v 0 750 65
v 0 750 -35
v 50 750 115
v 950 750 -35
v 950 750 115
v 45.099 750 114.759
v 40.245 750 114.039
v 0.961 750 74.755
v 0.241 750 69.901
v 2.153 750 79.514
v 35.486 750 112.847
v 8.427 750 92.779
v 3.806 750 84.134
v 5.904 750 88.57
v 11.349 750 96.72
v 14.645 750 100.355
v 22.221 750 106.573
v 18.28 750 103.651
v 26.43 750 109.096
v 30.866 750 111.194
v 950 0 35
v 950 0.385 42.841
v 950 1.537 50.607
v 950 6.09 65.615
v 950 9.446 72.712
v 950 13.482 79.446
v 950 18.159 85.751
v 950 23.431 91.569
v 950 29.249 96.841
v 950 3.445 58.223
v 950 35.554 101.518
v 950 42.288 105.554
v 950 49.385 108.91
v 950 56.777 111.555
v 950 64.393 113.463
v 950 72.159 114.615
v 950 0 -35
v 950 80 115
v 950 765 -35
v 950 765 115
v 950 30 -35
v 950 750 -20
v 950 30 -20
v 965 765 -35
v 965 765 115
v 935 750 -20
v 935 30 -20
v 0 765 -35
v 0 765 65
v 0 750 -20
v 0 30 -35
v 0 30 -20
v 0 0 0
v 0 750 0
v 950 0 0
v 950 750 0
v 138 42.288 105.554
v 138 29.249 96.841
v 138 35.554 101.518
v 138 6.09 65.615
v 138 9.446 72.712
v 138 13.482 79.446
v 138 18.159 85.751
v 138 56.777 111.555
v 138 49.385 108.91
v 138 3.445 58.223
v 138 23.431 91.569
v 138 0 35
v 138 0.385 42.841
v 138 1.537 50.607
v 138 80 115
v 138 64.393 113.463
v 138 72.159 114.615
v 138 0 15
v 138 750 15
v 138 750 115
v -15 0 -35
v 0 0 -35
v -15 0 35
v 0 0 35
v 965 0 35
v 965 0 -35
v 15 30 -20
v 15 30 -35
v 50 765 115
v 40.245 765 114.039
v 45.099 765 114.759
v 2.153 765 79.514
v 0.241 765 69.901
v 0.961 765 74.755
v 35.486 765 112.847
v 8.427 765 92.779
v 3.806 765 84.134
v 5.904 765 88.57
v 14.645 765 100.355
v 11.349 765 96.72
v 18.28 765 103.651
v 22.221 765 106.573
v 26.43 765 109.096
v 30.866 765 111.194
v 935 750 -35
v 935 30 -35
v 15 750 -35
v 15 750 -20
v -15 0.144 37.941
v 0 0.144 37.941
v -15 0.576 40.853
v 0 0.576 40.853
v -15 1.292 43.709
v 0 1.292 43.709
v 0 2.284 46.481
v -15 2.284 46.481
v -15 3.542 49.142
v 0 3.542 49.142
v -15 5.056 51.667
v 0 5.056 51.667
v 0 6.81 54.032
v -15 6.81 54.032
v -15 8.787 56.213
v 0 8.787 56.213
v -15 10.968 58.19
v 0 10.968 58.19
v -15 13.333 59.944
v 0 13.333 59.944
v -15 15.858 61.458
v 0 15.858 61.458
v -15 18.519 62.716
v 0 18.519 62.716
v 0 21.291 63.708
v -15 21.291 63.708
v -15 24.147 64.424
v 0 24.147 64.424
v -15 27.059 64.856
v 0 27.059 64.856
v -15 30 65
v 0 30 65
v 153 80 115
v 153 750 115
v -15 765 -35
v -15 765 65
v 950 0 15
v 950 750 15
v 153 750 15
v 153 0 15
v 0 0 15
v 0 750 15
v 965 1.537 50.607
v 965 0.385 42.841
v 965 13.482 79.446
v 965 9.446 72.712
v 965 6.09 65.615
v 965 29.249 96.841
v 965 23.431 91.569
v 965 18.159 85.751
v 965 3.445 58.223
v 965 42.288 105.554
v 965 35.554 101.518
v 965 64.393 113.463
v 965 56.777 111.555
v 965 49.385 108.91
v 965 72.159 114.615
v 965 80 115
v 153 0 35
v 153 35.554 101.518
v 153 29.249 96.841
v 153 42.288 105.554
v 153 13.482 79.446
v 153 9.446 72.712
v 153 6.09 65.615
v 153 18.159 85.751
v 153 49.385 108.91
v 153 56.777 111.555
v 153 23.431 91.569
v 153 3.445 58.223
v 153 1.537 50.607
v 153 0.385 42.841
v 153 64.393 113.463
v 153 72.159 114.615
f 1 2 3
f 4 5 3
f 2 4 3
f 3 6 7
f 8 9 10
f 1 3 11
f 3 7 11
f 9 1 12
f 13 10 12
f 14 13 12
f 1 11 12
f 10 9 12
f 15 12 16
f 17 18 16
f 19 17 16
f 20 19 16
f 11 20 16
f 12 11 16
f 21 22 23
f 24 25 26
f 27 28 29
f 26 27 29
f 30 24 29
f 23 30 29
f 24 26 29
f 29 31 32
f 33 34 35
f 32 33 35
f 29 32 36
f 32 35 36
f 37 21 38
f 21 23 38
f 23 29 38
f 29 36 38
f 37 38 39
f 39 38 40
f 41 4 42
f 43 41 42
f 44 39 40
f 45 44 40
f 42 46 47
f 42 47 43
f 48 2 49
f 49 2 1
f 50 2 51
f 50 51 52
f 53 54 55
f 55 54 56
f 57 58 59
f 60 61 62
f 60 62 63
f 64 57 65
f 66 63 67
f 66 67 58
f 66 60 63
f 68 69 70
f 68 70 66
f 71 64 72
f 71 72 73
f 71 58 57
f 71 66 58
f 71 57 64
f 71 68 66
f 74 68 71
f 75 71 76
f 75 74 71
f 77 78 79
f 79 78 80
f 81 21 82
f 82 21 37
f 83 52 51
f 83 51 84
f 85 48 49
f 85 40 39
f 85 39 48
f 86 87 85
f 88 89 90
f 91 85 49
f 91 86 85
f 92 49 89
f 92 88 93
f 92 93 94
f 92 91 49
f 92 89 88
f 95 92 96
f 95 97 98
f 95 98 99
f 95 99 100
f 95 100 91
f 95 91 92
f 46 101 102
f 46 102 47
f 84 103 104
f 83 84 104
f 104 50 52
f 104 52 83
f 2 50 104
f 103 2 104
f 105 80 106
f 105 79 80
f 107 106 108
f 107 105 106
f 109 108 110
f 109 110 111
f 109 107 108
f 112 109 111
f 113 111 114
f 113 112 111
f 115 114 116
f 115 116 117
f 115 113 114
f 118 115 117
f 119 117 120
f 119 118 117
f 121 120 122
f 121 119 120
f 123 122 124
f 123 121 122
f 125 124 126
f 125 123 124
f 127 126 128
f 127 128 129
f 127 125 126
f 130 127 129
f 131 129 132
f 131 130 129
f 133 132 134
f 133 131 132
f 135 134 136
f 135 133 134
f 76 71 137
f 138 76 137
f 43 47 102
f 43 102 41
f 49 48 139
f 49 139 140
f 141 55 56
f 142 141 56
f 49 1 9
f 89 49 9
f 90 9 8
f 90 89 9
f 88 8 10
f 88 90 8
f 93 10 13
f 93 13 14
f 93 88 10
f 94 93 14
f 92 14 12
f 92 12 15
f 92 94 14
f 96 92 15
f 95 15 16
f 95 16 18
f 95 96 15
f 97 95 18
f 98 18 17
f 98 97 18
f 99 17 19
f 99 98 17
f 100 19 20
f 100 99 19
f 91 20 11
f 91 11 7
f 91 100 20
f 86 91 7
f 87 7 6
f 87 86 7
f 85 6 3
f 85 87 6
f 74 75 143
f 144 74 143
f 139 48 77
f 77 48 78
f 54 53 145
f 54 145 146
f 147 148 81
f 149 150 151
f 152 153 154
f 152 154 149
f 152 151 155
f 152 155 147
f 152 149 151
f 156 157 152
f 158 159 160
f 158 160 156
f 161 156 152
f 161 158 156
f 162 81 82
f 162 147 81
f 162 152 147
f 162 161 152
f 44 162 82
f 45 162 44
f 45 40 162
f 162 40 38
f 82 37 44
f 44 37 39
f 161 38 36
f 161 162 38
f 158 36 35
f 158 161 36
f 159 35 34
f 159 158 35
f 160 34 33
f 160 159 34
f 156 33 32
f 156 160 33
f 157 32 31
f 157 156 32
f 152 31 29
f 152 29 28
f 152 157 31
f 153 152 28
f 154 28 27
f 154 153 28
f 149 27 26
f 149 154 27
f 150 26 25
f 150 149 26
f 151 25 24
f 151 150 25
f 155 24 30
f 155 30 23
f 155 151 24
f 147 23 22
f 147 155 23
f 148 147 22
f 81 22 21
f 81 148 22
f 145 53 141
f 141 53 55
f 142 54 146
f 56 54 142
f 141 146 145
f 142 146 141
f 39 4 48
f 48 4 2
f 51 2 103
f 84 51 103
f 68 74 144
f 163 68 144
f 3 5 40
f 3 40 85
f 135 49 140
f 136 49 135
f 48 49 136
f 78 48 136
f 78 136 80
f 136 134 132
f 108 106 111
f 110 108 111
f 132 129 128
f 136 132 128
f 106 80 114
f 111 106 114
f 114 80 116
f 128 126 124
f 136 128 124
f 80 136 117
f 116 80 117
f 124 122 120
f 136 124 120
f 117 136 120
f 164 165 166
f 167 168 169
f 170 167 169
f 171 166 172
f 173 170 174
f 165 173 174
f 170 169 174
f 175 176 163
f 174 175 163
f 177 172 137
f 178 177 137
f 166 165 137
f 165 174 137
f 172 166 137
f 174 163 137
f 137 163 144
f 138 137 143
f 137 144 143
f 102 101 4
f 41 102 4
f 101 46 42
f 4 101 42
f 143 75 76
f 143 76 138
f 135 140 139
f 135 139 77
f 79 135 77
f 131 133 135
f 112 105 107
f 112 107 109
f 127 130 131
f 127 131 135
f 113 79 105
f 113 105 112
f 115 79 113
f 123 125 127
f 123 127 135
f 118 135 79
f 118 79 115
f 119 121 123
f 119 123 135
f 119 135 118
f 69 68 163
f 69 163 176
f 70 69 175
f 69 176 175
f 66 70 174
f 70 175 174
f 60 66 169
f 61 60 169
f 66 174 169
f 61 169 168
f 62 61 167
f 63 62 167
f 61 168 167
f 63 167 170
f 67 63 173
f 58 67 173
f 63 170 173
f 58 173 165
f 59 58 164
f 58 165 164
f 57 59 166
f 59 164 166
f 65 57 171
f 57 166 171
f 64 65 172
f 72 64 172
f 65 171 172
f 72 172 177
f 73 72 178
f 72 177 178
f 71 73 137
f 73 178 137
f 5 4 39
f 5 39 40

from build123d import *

# Parameters (mm, degrees)
F0_W      = 950
F0_H      = 750
F1_DEPTH  = 15
F2_W      = 750
F2_H      = 15
F3_DEPTH  = 15
F4_R      = 80
F5_W      = 765
F5_H      = 100
F6_DEPTH  = 15
F7_R      = 30
F8_W      = 15
F8_H      = 750
F9_DEPTH  = 100
F10_R     = 80
F11_W     = 950
F11_H     = 150
F12_DEPTH = 15
F13_R     = 50
F14_W     = 15
F14_H     = 15
F15_DEPTH = 720


# Not quite as in the source:
# - a feature names something its author has since deleted; it is built from what else it names


with BuildPart() as f1:
    # F0 (on Top) → F1 (new body)
    with BuildSketch(Plane.XY):
        with Locations((475, 375)):
            Rectangle(F0_W, F0_H)
    extrude(amount=F1_DEPTH)


with BuildPart() as f3:
    # F2 (on face) → F3 (new body)
    with BuildSketch(Plane.YZ.offset(950)):
        Polygon((0, 0), (0, -35), (765, -35), (765, 115), (0, 115), (0, 15), (750, 15), (750, 0), align=None)
        with Locations((375, 7.5)):
            Rectangle(F2_W, F2_H)
    extrude(amount=F3_DEPTH)

    # F4
    f4_edges = [f3.edges().sort_by_distance(p)[0] for p in [
        (957.5, 0, 115),
    ]]
    fillet(f4_edges, radius=F4_R)


with BuildPart() as f6:
    # F5 (on face) → F6 (new body)
    with BuildSketch(Plane(origin=(0, 0, 0), x_dir=(0, -1, 0), z_dir=(-1, 0, 0))):
        with Locations((-382.5, 15)):
            Rectangle(F5_W, F5_H)
    extrude(amount=F6_DEPTH)

    # F7
    f7_edges = [f6.edges().sort_by_distance(p)[0] for p in [
        (-7.5, 0, 65),
    ]]
    fillet(f7_edges, radius=F7_R)


with BuildPart() as f9:
    # F8 (on face) → F9 (new body)
    with BuildSketch(Plane.XY.offset(15)):
        with Locations((145.5, 375)):
            Rectangle(F8_W, F8_H)
    extrude(amount=F9_DEPTH)

    # F10
    f10_edges = [f9.edges().sort_by_distance(p)[0] for p in [
        (145.5, 0, 115),
    ]]
    fillet(f10_edges, radius=F10_R)


with BuildPart() as f12:
    # F11 (on face) → F12 (new body)
    with BuildSketch(Plane(origin=(0, 750, 0), x_dir=(-1, 0, 0), z_dir=(0, 1, 0))):
        with Locations((-475, 40)):
            Rectangle(F11_W, F11_H)
    extrude(amount=F12_DEPTH)

    # F13
    f13_edges = [f12.edges().sort_by_distance(p)[0] for p in [
        (0, 757.5, 115),
    ]]
    fillet(f13_edges, radius=F13_R)


with BuildPart() as f15:
    # F14 (on face) → F15 (new body)
    with BuildSketch(Plane.XZ.offset(-750)):
        with Locations((7.5, -27.5)):
            Rectangle(F14_W, F14_H)
    extrude(amount=F15_DEPTH)


with BuildPart() as f15b:
    # F14 (on face) → F15, piece 2 (new body)
    with BuildSketch(Plane.XZ.offset(-750)):
        with Locations((942.5, -27.5)):
            Rectangle(F14_W, F14_H)
    extrude(amount=F15_DEPTH)


solid = Compound([f1.part, f3.part, f6.part, f9.part, f12.part, f15.part, f15b.part])
